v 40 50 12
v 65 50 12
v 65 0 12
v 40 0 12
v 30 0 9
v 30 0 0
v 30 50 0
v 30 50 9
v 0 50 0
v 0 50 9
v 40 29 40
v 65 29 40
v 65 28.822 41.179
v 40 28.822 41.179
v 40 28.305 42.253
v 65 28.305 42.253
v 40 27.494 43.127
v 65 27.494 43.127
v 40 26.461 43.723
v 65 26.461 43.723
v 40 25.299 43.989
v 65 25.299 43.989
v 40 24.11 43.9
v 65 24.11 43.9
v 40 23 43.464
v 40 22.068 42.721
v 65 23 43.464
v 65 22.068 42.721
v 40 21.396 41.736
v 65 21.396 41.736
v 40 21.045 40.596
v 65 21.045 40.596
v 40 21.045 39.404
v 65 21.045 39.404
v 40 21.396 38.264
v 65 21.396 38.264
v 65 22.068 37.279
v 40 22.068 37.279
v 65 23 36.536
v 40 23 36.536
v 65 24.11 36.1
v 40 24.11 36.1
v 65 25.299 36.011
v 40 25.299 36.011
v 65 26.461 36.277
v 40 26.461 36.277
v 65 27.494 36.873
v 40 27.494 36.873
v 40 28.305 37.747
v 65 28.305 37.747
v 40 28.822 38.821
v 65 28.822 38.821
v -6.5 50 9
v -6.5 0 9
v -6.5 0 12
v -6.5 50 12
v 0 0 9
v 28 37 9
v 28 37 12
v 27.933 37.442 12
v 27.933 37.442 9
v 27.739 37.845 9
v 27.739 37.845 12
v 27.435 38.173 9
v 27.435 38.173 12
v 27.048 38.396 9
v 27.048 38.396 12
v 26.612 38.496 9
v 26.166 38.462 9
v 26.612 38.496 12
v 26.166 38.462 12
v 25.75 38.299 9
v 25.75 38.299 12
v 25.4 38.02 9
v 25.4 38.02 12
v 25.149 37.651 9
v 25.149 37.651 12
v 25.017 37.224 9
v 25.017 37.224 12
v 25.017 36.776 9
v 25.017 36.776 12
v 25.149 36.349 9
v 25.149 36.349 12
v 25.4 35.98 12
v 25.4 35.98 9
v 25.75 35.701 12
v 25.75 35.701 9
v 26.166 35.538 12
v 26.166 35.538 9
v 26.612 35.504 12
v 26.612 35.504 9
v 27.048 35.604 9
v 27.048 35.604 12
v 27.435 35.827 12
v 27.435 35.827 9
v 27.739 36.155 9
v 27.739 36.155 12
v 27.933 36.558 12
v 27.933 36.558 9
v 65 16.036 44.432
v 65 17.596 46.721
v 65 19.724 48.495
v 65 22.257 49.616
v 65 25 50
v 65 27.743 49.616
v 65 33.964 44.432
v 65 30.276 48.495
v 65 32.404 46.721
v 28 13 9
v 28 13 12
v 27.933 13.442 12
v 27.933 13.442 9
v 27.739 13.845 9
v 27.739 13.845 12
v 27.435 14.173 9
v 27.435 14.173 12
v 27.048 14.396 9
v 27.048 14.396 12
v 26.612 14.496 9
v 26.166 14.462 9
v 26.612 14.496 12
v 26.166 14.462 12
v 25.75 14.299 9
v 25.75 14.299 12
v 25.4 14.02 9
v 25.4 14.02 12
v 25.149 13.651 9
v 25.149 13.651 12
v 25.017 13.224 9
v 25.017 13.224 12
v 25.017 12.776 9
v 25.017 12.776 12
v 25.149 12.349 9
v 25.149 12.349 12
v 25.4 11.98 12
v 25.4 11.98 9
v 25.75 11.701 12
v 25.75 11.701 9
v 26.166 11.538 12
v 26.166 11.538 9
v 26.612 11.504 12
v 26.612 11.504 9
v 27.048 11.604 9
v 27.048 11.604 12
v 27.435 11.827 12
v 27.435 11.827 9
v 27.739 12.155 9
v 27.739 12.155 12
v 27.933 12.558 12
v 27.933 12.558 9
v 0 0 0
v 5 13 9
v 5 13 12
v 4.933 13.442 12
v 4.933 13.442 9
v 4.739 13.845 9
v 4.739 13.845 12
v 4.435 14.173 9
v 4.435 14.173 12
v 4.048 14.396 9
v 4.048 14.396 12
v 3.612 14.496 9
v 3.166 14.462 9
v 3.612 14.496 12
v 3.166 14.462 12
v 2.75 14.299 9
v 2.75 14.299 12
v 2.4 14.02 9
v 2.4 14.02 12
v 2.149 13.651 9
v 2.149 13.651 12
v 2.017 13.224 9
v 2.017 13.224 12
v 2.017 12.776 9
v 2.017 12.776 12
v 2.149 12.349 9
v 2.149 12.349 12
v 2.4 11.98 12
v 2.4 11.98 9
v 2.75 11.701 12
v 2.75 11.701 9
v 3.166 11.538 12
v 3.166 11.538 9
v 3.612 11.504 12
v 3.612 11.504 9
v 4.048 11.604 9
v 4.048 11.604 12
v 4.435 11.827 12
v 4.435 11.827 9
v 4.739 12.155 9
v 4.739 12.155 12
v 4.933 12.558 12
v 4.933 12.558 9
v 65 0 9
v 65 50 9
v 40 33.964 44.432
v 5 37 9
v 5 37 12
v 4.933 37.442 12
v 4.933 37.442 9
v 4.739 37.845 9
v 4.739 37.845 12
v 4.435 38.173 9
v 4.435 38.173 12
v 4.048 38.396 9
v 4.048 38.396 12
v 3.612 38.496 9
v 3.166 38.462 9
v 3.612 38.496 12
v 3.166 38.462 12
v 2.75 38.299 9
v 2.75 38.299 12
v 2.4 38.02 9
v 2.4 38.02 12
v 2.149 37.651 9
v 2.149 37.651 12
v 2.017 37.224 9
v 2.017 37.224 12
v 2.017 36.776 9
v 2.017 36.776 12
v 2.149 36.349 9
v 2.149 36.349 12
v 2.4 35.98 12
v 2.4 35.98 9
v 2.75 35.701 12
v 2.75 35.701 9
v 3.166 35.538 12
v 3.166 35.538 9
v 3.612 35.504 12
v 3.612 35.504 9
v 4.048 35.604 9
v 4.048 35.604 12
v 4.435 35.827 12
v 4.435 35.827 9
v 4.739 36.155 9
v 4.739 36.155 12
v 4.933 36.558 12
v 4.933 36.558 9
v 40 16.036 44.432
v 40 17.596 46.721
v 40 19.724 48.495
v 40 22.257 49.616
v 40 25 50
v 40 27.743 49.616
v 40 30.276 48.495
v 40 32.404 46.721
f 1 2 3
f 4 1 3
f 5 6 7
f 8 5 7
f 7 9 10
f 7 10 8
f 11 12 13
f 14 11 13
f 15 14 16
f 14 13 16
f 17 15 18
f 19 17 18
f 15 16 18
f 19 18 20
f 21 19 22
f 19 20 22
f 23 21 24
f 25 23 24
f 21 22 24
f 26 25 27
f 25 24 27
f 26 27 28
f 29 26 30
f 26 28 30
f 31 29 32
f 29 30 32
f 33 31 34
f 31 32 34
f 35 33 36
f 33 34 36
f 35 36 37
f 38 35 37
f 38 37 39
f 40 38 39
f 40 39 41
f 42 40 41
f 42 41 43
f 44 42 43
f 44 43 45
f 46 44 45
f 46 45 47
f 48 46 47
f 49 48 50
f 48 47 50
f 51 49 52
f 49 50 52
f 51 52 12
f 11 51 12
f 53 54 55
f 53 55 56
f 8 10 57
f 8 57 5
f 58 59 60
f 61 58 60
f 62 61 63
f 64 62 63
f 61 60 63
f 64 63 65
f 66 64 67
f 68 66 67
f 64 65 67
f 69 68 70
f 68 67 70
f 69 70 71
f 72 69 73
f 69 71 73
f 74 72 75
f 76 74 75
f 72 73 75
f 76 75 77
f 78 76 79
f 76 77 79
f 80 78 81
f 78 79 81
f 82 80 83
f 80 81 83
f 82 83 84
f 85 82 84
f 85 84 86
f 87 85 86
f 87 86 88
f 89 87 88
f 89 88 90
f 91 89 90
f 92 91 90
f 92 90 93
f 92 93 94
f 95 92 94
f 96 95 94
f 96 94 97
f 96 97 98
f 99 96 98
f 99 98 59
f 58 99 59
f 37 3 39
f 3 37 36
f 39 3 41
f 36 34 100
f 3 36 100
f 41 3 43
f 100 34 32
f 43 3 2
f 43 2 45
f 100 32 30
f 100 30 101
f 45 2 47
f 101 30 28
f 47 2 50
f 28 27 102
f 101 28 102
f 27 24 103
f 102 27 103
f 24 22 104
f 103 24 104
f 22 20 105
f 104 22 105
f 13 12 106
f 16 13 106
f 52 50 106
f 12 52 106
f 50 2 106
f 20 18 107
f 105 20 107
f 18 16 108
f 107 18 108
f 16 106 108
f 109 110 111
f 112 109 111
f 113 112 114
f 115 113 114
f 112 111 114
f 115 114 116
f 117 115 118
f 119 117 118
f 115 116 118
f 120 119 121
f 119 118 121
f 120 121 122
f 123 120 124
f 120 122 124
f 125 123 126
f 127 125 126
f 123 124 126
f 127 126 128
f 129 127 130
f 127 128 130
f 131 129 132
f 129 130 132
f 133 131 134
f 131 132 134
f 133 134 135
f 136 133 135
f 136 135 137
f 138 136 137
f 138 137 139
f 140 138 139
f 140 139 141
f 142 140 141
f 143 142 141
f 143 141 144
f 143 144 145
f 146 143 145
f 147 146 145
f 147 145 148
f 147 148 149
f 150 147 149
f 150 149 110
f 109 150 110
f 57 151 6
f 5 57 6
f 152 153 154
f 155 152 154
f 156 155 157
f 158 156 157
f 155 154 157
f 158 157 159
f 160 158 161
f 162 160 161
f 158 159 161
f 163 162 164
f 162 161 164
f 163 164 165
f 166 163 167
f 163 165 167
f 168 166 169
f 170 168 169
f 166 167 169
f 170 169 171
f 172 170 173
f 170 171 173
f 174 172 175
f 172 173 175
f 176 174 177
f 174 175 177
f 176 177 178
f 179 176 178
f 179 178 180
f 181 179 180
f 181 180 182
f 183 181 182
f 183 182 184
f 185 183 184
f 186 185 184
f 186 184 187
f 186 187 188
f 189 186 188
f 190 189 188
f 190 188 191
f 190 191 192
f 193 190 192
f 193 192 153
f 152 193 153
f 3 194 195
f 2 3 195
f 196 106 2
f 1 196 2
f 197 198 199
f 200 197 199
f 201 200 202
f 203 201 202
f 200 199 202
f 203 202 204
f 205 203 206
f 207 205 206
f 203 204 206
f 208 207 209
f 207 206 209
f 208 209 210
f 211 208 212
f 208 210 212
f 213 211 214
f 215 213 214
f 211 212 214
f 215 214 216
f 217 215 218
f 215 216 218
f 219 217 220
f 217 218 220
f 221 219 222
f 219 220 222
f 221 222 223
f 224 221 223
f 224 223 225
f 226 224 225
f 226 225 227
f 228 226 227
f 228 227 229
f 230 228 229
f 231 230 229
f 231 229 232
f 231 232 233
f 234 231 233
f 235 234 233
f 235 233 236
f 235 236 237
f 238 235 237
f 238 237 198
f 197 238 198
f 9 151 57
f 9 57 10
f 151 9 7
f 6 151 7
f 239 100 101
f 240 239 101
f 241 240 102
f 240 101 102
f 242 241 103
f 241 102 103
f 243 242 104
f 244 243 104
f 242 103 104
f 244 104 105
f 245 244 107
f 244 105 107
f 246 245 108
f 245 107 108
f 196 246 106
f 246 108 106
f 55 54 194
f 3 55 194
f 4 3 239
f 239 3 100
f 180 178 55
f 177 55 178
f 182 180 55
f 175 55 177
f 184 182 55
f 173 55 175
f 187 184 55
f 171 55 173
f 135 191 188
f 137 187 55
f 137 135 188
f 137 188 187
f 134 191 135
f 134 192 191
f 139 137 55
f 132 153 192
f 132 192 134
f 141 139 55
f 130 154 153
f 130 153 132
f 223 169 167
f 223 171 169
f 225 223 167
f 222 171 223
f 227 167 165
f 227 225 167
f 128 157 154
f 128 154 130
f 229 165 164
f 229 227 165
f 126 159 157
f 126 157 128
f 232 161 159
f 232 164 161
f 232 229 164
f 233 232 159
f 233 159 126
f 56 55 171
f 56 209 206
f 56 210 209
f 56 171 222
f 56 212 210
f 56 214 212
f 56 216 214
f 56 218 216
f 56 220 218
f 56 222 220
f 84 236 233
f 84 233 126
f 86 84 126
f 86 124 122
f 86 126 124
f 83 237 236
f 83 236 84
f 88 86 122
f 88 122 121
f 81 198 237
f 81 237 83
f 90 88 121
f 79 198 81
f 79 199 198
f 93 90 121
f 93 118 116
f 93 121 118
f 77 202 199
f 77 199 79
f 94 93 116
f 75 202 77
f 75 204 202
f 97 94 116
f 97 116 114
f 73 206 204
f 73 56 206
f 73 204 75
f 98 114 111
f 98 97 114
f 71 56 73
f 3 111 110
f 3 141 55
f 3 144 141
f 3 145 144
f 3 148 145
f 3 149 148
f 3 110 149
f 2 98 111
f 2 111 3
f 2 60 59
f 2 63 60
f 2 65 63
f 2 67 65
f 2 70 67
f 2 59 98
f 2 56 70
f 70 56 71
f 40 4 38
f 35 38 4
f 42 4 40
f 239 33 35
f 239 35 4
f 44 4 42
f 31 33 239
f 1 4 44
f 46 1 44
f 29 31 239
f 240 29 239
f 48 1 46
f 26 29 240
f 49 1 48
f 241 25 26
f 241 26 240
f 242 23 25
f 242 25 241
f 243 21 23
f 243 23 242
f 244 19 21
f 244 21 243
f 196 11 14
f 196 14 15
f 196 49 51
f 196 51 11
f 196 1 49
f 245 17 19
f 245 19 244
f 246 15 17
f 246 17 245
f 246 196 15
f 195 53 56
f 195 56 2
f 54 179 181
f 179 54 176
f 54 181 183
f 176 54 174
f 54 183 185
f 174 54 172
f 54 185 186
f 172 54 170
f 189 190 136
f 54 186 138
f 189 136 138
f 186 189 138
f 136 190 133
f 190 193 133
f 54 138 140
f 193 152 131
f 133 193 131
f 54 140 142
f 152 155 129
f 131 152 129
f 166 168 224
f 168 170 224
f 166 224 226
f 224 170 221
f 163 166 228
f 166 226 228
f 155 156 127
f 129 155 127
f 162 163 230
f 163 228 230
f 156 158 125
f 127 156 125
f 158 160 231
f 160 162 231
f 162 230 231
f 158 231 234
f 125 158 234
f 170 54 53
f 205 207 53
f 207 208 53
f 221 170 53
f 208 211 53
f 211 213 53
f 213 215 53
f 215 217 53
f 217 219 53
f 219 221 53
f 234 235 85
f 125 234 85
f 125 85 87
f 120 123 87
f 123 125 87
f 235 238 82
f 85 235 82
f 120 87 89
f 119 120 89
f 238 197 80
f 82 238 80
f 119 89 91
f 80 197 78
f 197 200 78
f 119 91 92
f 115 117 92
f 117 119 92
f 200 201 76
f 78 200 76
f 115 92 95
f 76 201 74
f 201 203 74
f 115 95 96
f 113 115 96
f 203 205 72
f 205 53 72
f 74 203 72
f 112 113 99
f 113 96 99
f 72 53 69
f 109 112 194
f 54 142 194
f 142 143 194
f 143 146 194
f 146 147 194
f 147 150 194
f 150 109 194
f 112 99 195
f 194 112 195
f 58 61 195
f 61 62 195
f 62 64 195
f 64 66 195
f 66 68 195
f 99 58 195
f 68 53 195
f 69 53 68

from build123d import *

# Parameters (mm, degrees)
ESQUISSE1_W             = 30
ESQUISSE1_H             = 50
BOSS_EXTRU_1_DEPTH      = 9
ESQUISSE2_W             = 71.5
ESQUISSE2_H             = 50
BOSS_EXTRU_2_DEPTH      = 3
ESQUISSE3_R             = 4
BOSS_EXTRU_3_DEPTH      = 25
ESQUISSE4_R             = 1.5
ENL_V_MAT_EXTRU_1_DEPTH = 91.382520434


with BuildPart() as part:
    # Esquisse1 → Boss.-Extru.1 (new body)
    with BuildSketch(Plane.XY):
        with Locations((15, 25)):
            Rectangle(ESQUISSE1_W, ESQUISSE1_H)
    extrude(amount=BOSS_EXTRU_1_DEPTH)


with BuildPart() as body_2:
    # Esquisse2 → Boss.-Extru.2 (new body)
    with BuildSketch(Plane.XY.offset(9)):
        with Locations((29.25, 25)):
            Rectangle(ESQUISSE2_W, ESQUISSE2_H)
    extrude(amount=BOSS_EXTRU_2_DEPTH)

    # Esquisse4 → Enlèv. mat.-Extru.1 (cut, through all)
    with BuildSketch(Plane.XY.offset(12)):
        with Locations((26.5, 37)):
            Circle(ESQUISSE4_R)
        with Locations((26.5, 13)):
            Circle(ESQUISSE4_R)
        with Locations((3.5, 13)):
            Circle(ESQUISSE4_R)
        with Locations((3.5, 37)):
            Circle(ESQUISSE4_R)
    extrude(amount=-ENL_V_MAT_EXTRU_1_DEPTH, mode=Mode.SUBTRACT)


with BuildPart() as body_3:
    # Esquisse3 → Boss.-Extru.3 (new body)
    with BuildSketch(Plane(origin=(65, 0, 0), x_dir=(0, 0, -1), z_dir=(1, 0, 0))):
        with BuildLine():
            Line((-12, 50), (-12, 0))
            Line((-12, 0), (-44.432240069, 16.035891122))
            ThreePointArc((-44.432240069, 16.035891122), (-50, 25), (-44.432240069, 33.964108878))
            Line((-44.432240069, 33.964108878), (-12, 50))
        make_face()
        with Locations(Location((-40, 25, 0), (0, 0, 90))):
            Circle(ESQUISSE3_R, mode=Mode.SUBTRACT)
    extrude(amount=-BOSS_EXTRU_3_DEPTH)


solid = Compound([part.part, body_2.part, body_3.part])
